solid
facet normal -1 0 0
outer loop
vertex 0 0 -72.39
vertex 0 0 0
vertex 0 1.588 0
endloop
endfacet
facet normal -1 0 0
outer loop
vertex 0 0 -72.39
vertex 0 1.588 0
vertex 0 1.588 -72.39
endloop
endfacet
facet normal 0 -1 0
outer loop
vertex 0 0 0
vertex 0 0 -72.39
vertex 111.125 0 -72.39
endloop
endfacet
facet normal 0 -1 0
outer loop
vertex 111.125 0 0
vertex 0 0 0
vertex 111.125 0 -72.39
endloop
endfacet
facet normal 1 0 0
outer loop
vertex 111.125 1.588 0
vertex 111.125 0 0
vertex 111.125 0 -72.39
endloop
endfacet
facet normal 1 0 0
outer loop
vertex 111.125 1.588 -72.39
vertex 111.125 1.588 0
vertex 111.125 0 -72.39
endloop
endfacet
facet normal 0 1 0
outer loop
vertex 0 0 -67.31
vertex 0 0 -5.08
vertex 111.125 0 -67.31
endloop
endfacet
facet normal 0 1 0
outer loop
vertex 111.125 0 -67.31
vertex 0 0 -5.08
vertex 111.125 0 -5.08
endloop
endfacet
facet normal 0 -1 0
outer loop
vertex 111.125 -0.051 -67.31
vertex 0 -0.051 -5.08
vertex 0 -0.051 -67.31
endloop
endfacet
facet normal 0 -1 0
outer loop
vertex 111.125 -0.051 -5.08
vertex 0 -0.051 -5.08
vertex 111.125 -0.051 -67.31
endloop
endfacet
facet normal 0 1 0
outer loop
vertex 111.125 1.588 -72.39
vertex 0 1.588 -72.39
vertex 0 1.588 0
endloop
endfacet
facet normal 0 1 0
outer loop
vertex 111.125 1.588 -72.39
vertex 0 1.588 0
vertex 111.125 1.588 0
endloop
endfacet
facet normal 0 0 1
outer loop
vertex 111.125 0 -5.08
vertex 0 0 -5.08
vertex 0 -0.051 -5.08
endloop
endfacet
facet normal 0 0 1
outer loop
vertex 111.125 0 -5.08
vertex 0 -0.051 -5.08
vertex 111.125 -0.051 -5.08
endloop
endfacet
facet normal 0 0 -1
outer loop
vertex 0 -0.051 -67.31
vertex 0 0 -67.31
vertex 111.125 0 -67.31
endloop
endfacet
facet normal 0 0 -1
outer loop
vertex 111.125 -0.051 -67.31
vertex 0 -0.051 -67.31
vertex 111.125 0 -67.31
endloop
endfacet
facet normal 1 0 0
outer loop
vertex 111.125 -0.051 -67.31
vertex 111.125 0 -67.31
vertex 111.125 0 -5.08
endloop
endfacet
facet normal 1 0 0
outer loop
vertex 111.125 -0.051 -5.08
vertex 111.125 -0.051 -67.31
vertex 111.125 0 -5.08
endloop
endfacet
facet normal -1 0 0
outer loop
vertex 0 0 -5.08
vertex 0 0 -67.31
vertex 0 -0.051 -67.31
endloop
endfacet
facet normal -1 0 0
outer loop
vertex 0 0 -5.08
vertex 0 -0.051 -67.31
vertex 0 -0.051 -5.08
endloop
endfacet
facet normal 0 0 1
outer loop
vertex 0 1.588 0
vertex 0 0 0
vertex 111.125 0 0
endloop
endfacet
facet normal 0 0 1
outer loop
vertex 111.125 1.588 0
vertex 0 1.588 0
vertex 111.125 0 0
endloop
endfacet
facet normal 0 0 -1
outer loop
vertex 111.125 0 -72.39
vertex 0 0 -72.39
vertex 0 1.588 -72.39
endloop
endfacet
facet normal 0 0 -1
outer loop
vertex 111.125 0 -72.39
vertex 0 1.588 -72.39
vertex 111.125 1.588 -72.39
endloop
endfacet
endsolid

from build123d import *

# Parameters (mm, degrees)
SKETCH1_W           = 111.125
SKETCH1_H           = 72.39
BOSS_EXTRUDE1_DEPTH = 1.5875
SKETCH2_W           = 111.125
SKETCH2_H           = 62.23
BOSS_EXTRUDE2_DEPTH = 0.0508


with BuildPart() as part:
    # Sketch1 → Boss-Extrude1 (new body)
    with BuildSketch(Plane(origin=(0, 0, 0), x_dir=(1, 0, 0), z_dir=(0, 1, 0))):
        with Locations((55.5625, 36.195)):
            Rectangle(SKETCH1_W, SKETCH1_H)
    extrude(amount=BOSS_EXTRUDE1_DEPTH)


with BuildPart() as body_2:
    # Sketch2 → Boss-Extrude2 (new body)
    with BuildSketch(Plane.XZ):
        with Locations((55.5625, -36.195)):
            Rectangle(SKETCH2_W, SKETCH2_H)
    extrude(amount=BOSS_EXTRUDE2_DEPTH)


solid = Compound([part.part, body_2.part])
